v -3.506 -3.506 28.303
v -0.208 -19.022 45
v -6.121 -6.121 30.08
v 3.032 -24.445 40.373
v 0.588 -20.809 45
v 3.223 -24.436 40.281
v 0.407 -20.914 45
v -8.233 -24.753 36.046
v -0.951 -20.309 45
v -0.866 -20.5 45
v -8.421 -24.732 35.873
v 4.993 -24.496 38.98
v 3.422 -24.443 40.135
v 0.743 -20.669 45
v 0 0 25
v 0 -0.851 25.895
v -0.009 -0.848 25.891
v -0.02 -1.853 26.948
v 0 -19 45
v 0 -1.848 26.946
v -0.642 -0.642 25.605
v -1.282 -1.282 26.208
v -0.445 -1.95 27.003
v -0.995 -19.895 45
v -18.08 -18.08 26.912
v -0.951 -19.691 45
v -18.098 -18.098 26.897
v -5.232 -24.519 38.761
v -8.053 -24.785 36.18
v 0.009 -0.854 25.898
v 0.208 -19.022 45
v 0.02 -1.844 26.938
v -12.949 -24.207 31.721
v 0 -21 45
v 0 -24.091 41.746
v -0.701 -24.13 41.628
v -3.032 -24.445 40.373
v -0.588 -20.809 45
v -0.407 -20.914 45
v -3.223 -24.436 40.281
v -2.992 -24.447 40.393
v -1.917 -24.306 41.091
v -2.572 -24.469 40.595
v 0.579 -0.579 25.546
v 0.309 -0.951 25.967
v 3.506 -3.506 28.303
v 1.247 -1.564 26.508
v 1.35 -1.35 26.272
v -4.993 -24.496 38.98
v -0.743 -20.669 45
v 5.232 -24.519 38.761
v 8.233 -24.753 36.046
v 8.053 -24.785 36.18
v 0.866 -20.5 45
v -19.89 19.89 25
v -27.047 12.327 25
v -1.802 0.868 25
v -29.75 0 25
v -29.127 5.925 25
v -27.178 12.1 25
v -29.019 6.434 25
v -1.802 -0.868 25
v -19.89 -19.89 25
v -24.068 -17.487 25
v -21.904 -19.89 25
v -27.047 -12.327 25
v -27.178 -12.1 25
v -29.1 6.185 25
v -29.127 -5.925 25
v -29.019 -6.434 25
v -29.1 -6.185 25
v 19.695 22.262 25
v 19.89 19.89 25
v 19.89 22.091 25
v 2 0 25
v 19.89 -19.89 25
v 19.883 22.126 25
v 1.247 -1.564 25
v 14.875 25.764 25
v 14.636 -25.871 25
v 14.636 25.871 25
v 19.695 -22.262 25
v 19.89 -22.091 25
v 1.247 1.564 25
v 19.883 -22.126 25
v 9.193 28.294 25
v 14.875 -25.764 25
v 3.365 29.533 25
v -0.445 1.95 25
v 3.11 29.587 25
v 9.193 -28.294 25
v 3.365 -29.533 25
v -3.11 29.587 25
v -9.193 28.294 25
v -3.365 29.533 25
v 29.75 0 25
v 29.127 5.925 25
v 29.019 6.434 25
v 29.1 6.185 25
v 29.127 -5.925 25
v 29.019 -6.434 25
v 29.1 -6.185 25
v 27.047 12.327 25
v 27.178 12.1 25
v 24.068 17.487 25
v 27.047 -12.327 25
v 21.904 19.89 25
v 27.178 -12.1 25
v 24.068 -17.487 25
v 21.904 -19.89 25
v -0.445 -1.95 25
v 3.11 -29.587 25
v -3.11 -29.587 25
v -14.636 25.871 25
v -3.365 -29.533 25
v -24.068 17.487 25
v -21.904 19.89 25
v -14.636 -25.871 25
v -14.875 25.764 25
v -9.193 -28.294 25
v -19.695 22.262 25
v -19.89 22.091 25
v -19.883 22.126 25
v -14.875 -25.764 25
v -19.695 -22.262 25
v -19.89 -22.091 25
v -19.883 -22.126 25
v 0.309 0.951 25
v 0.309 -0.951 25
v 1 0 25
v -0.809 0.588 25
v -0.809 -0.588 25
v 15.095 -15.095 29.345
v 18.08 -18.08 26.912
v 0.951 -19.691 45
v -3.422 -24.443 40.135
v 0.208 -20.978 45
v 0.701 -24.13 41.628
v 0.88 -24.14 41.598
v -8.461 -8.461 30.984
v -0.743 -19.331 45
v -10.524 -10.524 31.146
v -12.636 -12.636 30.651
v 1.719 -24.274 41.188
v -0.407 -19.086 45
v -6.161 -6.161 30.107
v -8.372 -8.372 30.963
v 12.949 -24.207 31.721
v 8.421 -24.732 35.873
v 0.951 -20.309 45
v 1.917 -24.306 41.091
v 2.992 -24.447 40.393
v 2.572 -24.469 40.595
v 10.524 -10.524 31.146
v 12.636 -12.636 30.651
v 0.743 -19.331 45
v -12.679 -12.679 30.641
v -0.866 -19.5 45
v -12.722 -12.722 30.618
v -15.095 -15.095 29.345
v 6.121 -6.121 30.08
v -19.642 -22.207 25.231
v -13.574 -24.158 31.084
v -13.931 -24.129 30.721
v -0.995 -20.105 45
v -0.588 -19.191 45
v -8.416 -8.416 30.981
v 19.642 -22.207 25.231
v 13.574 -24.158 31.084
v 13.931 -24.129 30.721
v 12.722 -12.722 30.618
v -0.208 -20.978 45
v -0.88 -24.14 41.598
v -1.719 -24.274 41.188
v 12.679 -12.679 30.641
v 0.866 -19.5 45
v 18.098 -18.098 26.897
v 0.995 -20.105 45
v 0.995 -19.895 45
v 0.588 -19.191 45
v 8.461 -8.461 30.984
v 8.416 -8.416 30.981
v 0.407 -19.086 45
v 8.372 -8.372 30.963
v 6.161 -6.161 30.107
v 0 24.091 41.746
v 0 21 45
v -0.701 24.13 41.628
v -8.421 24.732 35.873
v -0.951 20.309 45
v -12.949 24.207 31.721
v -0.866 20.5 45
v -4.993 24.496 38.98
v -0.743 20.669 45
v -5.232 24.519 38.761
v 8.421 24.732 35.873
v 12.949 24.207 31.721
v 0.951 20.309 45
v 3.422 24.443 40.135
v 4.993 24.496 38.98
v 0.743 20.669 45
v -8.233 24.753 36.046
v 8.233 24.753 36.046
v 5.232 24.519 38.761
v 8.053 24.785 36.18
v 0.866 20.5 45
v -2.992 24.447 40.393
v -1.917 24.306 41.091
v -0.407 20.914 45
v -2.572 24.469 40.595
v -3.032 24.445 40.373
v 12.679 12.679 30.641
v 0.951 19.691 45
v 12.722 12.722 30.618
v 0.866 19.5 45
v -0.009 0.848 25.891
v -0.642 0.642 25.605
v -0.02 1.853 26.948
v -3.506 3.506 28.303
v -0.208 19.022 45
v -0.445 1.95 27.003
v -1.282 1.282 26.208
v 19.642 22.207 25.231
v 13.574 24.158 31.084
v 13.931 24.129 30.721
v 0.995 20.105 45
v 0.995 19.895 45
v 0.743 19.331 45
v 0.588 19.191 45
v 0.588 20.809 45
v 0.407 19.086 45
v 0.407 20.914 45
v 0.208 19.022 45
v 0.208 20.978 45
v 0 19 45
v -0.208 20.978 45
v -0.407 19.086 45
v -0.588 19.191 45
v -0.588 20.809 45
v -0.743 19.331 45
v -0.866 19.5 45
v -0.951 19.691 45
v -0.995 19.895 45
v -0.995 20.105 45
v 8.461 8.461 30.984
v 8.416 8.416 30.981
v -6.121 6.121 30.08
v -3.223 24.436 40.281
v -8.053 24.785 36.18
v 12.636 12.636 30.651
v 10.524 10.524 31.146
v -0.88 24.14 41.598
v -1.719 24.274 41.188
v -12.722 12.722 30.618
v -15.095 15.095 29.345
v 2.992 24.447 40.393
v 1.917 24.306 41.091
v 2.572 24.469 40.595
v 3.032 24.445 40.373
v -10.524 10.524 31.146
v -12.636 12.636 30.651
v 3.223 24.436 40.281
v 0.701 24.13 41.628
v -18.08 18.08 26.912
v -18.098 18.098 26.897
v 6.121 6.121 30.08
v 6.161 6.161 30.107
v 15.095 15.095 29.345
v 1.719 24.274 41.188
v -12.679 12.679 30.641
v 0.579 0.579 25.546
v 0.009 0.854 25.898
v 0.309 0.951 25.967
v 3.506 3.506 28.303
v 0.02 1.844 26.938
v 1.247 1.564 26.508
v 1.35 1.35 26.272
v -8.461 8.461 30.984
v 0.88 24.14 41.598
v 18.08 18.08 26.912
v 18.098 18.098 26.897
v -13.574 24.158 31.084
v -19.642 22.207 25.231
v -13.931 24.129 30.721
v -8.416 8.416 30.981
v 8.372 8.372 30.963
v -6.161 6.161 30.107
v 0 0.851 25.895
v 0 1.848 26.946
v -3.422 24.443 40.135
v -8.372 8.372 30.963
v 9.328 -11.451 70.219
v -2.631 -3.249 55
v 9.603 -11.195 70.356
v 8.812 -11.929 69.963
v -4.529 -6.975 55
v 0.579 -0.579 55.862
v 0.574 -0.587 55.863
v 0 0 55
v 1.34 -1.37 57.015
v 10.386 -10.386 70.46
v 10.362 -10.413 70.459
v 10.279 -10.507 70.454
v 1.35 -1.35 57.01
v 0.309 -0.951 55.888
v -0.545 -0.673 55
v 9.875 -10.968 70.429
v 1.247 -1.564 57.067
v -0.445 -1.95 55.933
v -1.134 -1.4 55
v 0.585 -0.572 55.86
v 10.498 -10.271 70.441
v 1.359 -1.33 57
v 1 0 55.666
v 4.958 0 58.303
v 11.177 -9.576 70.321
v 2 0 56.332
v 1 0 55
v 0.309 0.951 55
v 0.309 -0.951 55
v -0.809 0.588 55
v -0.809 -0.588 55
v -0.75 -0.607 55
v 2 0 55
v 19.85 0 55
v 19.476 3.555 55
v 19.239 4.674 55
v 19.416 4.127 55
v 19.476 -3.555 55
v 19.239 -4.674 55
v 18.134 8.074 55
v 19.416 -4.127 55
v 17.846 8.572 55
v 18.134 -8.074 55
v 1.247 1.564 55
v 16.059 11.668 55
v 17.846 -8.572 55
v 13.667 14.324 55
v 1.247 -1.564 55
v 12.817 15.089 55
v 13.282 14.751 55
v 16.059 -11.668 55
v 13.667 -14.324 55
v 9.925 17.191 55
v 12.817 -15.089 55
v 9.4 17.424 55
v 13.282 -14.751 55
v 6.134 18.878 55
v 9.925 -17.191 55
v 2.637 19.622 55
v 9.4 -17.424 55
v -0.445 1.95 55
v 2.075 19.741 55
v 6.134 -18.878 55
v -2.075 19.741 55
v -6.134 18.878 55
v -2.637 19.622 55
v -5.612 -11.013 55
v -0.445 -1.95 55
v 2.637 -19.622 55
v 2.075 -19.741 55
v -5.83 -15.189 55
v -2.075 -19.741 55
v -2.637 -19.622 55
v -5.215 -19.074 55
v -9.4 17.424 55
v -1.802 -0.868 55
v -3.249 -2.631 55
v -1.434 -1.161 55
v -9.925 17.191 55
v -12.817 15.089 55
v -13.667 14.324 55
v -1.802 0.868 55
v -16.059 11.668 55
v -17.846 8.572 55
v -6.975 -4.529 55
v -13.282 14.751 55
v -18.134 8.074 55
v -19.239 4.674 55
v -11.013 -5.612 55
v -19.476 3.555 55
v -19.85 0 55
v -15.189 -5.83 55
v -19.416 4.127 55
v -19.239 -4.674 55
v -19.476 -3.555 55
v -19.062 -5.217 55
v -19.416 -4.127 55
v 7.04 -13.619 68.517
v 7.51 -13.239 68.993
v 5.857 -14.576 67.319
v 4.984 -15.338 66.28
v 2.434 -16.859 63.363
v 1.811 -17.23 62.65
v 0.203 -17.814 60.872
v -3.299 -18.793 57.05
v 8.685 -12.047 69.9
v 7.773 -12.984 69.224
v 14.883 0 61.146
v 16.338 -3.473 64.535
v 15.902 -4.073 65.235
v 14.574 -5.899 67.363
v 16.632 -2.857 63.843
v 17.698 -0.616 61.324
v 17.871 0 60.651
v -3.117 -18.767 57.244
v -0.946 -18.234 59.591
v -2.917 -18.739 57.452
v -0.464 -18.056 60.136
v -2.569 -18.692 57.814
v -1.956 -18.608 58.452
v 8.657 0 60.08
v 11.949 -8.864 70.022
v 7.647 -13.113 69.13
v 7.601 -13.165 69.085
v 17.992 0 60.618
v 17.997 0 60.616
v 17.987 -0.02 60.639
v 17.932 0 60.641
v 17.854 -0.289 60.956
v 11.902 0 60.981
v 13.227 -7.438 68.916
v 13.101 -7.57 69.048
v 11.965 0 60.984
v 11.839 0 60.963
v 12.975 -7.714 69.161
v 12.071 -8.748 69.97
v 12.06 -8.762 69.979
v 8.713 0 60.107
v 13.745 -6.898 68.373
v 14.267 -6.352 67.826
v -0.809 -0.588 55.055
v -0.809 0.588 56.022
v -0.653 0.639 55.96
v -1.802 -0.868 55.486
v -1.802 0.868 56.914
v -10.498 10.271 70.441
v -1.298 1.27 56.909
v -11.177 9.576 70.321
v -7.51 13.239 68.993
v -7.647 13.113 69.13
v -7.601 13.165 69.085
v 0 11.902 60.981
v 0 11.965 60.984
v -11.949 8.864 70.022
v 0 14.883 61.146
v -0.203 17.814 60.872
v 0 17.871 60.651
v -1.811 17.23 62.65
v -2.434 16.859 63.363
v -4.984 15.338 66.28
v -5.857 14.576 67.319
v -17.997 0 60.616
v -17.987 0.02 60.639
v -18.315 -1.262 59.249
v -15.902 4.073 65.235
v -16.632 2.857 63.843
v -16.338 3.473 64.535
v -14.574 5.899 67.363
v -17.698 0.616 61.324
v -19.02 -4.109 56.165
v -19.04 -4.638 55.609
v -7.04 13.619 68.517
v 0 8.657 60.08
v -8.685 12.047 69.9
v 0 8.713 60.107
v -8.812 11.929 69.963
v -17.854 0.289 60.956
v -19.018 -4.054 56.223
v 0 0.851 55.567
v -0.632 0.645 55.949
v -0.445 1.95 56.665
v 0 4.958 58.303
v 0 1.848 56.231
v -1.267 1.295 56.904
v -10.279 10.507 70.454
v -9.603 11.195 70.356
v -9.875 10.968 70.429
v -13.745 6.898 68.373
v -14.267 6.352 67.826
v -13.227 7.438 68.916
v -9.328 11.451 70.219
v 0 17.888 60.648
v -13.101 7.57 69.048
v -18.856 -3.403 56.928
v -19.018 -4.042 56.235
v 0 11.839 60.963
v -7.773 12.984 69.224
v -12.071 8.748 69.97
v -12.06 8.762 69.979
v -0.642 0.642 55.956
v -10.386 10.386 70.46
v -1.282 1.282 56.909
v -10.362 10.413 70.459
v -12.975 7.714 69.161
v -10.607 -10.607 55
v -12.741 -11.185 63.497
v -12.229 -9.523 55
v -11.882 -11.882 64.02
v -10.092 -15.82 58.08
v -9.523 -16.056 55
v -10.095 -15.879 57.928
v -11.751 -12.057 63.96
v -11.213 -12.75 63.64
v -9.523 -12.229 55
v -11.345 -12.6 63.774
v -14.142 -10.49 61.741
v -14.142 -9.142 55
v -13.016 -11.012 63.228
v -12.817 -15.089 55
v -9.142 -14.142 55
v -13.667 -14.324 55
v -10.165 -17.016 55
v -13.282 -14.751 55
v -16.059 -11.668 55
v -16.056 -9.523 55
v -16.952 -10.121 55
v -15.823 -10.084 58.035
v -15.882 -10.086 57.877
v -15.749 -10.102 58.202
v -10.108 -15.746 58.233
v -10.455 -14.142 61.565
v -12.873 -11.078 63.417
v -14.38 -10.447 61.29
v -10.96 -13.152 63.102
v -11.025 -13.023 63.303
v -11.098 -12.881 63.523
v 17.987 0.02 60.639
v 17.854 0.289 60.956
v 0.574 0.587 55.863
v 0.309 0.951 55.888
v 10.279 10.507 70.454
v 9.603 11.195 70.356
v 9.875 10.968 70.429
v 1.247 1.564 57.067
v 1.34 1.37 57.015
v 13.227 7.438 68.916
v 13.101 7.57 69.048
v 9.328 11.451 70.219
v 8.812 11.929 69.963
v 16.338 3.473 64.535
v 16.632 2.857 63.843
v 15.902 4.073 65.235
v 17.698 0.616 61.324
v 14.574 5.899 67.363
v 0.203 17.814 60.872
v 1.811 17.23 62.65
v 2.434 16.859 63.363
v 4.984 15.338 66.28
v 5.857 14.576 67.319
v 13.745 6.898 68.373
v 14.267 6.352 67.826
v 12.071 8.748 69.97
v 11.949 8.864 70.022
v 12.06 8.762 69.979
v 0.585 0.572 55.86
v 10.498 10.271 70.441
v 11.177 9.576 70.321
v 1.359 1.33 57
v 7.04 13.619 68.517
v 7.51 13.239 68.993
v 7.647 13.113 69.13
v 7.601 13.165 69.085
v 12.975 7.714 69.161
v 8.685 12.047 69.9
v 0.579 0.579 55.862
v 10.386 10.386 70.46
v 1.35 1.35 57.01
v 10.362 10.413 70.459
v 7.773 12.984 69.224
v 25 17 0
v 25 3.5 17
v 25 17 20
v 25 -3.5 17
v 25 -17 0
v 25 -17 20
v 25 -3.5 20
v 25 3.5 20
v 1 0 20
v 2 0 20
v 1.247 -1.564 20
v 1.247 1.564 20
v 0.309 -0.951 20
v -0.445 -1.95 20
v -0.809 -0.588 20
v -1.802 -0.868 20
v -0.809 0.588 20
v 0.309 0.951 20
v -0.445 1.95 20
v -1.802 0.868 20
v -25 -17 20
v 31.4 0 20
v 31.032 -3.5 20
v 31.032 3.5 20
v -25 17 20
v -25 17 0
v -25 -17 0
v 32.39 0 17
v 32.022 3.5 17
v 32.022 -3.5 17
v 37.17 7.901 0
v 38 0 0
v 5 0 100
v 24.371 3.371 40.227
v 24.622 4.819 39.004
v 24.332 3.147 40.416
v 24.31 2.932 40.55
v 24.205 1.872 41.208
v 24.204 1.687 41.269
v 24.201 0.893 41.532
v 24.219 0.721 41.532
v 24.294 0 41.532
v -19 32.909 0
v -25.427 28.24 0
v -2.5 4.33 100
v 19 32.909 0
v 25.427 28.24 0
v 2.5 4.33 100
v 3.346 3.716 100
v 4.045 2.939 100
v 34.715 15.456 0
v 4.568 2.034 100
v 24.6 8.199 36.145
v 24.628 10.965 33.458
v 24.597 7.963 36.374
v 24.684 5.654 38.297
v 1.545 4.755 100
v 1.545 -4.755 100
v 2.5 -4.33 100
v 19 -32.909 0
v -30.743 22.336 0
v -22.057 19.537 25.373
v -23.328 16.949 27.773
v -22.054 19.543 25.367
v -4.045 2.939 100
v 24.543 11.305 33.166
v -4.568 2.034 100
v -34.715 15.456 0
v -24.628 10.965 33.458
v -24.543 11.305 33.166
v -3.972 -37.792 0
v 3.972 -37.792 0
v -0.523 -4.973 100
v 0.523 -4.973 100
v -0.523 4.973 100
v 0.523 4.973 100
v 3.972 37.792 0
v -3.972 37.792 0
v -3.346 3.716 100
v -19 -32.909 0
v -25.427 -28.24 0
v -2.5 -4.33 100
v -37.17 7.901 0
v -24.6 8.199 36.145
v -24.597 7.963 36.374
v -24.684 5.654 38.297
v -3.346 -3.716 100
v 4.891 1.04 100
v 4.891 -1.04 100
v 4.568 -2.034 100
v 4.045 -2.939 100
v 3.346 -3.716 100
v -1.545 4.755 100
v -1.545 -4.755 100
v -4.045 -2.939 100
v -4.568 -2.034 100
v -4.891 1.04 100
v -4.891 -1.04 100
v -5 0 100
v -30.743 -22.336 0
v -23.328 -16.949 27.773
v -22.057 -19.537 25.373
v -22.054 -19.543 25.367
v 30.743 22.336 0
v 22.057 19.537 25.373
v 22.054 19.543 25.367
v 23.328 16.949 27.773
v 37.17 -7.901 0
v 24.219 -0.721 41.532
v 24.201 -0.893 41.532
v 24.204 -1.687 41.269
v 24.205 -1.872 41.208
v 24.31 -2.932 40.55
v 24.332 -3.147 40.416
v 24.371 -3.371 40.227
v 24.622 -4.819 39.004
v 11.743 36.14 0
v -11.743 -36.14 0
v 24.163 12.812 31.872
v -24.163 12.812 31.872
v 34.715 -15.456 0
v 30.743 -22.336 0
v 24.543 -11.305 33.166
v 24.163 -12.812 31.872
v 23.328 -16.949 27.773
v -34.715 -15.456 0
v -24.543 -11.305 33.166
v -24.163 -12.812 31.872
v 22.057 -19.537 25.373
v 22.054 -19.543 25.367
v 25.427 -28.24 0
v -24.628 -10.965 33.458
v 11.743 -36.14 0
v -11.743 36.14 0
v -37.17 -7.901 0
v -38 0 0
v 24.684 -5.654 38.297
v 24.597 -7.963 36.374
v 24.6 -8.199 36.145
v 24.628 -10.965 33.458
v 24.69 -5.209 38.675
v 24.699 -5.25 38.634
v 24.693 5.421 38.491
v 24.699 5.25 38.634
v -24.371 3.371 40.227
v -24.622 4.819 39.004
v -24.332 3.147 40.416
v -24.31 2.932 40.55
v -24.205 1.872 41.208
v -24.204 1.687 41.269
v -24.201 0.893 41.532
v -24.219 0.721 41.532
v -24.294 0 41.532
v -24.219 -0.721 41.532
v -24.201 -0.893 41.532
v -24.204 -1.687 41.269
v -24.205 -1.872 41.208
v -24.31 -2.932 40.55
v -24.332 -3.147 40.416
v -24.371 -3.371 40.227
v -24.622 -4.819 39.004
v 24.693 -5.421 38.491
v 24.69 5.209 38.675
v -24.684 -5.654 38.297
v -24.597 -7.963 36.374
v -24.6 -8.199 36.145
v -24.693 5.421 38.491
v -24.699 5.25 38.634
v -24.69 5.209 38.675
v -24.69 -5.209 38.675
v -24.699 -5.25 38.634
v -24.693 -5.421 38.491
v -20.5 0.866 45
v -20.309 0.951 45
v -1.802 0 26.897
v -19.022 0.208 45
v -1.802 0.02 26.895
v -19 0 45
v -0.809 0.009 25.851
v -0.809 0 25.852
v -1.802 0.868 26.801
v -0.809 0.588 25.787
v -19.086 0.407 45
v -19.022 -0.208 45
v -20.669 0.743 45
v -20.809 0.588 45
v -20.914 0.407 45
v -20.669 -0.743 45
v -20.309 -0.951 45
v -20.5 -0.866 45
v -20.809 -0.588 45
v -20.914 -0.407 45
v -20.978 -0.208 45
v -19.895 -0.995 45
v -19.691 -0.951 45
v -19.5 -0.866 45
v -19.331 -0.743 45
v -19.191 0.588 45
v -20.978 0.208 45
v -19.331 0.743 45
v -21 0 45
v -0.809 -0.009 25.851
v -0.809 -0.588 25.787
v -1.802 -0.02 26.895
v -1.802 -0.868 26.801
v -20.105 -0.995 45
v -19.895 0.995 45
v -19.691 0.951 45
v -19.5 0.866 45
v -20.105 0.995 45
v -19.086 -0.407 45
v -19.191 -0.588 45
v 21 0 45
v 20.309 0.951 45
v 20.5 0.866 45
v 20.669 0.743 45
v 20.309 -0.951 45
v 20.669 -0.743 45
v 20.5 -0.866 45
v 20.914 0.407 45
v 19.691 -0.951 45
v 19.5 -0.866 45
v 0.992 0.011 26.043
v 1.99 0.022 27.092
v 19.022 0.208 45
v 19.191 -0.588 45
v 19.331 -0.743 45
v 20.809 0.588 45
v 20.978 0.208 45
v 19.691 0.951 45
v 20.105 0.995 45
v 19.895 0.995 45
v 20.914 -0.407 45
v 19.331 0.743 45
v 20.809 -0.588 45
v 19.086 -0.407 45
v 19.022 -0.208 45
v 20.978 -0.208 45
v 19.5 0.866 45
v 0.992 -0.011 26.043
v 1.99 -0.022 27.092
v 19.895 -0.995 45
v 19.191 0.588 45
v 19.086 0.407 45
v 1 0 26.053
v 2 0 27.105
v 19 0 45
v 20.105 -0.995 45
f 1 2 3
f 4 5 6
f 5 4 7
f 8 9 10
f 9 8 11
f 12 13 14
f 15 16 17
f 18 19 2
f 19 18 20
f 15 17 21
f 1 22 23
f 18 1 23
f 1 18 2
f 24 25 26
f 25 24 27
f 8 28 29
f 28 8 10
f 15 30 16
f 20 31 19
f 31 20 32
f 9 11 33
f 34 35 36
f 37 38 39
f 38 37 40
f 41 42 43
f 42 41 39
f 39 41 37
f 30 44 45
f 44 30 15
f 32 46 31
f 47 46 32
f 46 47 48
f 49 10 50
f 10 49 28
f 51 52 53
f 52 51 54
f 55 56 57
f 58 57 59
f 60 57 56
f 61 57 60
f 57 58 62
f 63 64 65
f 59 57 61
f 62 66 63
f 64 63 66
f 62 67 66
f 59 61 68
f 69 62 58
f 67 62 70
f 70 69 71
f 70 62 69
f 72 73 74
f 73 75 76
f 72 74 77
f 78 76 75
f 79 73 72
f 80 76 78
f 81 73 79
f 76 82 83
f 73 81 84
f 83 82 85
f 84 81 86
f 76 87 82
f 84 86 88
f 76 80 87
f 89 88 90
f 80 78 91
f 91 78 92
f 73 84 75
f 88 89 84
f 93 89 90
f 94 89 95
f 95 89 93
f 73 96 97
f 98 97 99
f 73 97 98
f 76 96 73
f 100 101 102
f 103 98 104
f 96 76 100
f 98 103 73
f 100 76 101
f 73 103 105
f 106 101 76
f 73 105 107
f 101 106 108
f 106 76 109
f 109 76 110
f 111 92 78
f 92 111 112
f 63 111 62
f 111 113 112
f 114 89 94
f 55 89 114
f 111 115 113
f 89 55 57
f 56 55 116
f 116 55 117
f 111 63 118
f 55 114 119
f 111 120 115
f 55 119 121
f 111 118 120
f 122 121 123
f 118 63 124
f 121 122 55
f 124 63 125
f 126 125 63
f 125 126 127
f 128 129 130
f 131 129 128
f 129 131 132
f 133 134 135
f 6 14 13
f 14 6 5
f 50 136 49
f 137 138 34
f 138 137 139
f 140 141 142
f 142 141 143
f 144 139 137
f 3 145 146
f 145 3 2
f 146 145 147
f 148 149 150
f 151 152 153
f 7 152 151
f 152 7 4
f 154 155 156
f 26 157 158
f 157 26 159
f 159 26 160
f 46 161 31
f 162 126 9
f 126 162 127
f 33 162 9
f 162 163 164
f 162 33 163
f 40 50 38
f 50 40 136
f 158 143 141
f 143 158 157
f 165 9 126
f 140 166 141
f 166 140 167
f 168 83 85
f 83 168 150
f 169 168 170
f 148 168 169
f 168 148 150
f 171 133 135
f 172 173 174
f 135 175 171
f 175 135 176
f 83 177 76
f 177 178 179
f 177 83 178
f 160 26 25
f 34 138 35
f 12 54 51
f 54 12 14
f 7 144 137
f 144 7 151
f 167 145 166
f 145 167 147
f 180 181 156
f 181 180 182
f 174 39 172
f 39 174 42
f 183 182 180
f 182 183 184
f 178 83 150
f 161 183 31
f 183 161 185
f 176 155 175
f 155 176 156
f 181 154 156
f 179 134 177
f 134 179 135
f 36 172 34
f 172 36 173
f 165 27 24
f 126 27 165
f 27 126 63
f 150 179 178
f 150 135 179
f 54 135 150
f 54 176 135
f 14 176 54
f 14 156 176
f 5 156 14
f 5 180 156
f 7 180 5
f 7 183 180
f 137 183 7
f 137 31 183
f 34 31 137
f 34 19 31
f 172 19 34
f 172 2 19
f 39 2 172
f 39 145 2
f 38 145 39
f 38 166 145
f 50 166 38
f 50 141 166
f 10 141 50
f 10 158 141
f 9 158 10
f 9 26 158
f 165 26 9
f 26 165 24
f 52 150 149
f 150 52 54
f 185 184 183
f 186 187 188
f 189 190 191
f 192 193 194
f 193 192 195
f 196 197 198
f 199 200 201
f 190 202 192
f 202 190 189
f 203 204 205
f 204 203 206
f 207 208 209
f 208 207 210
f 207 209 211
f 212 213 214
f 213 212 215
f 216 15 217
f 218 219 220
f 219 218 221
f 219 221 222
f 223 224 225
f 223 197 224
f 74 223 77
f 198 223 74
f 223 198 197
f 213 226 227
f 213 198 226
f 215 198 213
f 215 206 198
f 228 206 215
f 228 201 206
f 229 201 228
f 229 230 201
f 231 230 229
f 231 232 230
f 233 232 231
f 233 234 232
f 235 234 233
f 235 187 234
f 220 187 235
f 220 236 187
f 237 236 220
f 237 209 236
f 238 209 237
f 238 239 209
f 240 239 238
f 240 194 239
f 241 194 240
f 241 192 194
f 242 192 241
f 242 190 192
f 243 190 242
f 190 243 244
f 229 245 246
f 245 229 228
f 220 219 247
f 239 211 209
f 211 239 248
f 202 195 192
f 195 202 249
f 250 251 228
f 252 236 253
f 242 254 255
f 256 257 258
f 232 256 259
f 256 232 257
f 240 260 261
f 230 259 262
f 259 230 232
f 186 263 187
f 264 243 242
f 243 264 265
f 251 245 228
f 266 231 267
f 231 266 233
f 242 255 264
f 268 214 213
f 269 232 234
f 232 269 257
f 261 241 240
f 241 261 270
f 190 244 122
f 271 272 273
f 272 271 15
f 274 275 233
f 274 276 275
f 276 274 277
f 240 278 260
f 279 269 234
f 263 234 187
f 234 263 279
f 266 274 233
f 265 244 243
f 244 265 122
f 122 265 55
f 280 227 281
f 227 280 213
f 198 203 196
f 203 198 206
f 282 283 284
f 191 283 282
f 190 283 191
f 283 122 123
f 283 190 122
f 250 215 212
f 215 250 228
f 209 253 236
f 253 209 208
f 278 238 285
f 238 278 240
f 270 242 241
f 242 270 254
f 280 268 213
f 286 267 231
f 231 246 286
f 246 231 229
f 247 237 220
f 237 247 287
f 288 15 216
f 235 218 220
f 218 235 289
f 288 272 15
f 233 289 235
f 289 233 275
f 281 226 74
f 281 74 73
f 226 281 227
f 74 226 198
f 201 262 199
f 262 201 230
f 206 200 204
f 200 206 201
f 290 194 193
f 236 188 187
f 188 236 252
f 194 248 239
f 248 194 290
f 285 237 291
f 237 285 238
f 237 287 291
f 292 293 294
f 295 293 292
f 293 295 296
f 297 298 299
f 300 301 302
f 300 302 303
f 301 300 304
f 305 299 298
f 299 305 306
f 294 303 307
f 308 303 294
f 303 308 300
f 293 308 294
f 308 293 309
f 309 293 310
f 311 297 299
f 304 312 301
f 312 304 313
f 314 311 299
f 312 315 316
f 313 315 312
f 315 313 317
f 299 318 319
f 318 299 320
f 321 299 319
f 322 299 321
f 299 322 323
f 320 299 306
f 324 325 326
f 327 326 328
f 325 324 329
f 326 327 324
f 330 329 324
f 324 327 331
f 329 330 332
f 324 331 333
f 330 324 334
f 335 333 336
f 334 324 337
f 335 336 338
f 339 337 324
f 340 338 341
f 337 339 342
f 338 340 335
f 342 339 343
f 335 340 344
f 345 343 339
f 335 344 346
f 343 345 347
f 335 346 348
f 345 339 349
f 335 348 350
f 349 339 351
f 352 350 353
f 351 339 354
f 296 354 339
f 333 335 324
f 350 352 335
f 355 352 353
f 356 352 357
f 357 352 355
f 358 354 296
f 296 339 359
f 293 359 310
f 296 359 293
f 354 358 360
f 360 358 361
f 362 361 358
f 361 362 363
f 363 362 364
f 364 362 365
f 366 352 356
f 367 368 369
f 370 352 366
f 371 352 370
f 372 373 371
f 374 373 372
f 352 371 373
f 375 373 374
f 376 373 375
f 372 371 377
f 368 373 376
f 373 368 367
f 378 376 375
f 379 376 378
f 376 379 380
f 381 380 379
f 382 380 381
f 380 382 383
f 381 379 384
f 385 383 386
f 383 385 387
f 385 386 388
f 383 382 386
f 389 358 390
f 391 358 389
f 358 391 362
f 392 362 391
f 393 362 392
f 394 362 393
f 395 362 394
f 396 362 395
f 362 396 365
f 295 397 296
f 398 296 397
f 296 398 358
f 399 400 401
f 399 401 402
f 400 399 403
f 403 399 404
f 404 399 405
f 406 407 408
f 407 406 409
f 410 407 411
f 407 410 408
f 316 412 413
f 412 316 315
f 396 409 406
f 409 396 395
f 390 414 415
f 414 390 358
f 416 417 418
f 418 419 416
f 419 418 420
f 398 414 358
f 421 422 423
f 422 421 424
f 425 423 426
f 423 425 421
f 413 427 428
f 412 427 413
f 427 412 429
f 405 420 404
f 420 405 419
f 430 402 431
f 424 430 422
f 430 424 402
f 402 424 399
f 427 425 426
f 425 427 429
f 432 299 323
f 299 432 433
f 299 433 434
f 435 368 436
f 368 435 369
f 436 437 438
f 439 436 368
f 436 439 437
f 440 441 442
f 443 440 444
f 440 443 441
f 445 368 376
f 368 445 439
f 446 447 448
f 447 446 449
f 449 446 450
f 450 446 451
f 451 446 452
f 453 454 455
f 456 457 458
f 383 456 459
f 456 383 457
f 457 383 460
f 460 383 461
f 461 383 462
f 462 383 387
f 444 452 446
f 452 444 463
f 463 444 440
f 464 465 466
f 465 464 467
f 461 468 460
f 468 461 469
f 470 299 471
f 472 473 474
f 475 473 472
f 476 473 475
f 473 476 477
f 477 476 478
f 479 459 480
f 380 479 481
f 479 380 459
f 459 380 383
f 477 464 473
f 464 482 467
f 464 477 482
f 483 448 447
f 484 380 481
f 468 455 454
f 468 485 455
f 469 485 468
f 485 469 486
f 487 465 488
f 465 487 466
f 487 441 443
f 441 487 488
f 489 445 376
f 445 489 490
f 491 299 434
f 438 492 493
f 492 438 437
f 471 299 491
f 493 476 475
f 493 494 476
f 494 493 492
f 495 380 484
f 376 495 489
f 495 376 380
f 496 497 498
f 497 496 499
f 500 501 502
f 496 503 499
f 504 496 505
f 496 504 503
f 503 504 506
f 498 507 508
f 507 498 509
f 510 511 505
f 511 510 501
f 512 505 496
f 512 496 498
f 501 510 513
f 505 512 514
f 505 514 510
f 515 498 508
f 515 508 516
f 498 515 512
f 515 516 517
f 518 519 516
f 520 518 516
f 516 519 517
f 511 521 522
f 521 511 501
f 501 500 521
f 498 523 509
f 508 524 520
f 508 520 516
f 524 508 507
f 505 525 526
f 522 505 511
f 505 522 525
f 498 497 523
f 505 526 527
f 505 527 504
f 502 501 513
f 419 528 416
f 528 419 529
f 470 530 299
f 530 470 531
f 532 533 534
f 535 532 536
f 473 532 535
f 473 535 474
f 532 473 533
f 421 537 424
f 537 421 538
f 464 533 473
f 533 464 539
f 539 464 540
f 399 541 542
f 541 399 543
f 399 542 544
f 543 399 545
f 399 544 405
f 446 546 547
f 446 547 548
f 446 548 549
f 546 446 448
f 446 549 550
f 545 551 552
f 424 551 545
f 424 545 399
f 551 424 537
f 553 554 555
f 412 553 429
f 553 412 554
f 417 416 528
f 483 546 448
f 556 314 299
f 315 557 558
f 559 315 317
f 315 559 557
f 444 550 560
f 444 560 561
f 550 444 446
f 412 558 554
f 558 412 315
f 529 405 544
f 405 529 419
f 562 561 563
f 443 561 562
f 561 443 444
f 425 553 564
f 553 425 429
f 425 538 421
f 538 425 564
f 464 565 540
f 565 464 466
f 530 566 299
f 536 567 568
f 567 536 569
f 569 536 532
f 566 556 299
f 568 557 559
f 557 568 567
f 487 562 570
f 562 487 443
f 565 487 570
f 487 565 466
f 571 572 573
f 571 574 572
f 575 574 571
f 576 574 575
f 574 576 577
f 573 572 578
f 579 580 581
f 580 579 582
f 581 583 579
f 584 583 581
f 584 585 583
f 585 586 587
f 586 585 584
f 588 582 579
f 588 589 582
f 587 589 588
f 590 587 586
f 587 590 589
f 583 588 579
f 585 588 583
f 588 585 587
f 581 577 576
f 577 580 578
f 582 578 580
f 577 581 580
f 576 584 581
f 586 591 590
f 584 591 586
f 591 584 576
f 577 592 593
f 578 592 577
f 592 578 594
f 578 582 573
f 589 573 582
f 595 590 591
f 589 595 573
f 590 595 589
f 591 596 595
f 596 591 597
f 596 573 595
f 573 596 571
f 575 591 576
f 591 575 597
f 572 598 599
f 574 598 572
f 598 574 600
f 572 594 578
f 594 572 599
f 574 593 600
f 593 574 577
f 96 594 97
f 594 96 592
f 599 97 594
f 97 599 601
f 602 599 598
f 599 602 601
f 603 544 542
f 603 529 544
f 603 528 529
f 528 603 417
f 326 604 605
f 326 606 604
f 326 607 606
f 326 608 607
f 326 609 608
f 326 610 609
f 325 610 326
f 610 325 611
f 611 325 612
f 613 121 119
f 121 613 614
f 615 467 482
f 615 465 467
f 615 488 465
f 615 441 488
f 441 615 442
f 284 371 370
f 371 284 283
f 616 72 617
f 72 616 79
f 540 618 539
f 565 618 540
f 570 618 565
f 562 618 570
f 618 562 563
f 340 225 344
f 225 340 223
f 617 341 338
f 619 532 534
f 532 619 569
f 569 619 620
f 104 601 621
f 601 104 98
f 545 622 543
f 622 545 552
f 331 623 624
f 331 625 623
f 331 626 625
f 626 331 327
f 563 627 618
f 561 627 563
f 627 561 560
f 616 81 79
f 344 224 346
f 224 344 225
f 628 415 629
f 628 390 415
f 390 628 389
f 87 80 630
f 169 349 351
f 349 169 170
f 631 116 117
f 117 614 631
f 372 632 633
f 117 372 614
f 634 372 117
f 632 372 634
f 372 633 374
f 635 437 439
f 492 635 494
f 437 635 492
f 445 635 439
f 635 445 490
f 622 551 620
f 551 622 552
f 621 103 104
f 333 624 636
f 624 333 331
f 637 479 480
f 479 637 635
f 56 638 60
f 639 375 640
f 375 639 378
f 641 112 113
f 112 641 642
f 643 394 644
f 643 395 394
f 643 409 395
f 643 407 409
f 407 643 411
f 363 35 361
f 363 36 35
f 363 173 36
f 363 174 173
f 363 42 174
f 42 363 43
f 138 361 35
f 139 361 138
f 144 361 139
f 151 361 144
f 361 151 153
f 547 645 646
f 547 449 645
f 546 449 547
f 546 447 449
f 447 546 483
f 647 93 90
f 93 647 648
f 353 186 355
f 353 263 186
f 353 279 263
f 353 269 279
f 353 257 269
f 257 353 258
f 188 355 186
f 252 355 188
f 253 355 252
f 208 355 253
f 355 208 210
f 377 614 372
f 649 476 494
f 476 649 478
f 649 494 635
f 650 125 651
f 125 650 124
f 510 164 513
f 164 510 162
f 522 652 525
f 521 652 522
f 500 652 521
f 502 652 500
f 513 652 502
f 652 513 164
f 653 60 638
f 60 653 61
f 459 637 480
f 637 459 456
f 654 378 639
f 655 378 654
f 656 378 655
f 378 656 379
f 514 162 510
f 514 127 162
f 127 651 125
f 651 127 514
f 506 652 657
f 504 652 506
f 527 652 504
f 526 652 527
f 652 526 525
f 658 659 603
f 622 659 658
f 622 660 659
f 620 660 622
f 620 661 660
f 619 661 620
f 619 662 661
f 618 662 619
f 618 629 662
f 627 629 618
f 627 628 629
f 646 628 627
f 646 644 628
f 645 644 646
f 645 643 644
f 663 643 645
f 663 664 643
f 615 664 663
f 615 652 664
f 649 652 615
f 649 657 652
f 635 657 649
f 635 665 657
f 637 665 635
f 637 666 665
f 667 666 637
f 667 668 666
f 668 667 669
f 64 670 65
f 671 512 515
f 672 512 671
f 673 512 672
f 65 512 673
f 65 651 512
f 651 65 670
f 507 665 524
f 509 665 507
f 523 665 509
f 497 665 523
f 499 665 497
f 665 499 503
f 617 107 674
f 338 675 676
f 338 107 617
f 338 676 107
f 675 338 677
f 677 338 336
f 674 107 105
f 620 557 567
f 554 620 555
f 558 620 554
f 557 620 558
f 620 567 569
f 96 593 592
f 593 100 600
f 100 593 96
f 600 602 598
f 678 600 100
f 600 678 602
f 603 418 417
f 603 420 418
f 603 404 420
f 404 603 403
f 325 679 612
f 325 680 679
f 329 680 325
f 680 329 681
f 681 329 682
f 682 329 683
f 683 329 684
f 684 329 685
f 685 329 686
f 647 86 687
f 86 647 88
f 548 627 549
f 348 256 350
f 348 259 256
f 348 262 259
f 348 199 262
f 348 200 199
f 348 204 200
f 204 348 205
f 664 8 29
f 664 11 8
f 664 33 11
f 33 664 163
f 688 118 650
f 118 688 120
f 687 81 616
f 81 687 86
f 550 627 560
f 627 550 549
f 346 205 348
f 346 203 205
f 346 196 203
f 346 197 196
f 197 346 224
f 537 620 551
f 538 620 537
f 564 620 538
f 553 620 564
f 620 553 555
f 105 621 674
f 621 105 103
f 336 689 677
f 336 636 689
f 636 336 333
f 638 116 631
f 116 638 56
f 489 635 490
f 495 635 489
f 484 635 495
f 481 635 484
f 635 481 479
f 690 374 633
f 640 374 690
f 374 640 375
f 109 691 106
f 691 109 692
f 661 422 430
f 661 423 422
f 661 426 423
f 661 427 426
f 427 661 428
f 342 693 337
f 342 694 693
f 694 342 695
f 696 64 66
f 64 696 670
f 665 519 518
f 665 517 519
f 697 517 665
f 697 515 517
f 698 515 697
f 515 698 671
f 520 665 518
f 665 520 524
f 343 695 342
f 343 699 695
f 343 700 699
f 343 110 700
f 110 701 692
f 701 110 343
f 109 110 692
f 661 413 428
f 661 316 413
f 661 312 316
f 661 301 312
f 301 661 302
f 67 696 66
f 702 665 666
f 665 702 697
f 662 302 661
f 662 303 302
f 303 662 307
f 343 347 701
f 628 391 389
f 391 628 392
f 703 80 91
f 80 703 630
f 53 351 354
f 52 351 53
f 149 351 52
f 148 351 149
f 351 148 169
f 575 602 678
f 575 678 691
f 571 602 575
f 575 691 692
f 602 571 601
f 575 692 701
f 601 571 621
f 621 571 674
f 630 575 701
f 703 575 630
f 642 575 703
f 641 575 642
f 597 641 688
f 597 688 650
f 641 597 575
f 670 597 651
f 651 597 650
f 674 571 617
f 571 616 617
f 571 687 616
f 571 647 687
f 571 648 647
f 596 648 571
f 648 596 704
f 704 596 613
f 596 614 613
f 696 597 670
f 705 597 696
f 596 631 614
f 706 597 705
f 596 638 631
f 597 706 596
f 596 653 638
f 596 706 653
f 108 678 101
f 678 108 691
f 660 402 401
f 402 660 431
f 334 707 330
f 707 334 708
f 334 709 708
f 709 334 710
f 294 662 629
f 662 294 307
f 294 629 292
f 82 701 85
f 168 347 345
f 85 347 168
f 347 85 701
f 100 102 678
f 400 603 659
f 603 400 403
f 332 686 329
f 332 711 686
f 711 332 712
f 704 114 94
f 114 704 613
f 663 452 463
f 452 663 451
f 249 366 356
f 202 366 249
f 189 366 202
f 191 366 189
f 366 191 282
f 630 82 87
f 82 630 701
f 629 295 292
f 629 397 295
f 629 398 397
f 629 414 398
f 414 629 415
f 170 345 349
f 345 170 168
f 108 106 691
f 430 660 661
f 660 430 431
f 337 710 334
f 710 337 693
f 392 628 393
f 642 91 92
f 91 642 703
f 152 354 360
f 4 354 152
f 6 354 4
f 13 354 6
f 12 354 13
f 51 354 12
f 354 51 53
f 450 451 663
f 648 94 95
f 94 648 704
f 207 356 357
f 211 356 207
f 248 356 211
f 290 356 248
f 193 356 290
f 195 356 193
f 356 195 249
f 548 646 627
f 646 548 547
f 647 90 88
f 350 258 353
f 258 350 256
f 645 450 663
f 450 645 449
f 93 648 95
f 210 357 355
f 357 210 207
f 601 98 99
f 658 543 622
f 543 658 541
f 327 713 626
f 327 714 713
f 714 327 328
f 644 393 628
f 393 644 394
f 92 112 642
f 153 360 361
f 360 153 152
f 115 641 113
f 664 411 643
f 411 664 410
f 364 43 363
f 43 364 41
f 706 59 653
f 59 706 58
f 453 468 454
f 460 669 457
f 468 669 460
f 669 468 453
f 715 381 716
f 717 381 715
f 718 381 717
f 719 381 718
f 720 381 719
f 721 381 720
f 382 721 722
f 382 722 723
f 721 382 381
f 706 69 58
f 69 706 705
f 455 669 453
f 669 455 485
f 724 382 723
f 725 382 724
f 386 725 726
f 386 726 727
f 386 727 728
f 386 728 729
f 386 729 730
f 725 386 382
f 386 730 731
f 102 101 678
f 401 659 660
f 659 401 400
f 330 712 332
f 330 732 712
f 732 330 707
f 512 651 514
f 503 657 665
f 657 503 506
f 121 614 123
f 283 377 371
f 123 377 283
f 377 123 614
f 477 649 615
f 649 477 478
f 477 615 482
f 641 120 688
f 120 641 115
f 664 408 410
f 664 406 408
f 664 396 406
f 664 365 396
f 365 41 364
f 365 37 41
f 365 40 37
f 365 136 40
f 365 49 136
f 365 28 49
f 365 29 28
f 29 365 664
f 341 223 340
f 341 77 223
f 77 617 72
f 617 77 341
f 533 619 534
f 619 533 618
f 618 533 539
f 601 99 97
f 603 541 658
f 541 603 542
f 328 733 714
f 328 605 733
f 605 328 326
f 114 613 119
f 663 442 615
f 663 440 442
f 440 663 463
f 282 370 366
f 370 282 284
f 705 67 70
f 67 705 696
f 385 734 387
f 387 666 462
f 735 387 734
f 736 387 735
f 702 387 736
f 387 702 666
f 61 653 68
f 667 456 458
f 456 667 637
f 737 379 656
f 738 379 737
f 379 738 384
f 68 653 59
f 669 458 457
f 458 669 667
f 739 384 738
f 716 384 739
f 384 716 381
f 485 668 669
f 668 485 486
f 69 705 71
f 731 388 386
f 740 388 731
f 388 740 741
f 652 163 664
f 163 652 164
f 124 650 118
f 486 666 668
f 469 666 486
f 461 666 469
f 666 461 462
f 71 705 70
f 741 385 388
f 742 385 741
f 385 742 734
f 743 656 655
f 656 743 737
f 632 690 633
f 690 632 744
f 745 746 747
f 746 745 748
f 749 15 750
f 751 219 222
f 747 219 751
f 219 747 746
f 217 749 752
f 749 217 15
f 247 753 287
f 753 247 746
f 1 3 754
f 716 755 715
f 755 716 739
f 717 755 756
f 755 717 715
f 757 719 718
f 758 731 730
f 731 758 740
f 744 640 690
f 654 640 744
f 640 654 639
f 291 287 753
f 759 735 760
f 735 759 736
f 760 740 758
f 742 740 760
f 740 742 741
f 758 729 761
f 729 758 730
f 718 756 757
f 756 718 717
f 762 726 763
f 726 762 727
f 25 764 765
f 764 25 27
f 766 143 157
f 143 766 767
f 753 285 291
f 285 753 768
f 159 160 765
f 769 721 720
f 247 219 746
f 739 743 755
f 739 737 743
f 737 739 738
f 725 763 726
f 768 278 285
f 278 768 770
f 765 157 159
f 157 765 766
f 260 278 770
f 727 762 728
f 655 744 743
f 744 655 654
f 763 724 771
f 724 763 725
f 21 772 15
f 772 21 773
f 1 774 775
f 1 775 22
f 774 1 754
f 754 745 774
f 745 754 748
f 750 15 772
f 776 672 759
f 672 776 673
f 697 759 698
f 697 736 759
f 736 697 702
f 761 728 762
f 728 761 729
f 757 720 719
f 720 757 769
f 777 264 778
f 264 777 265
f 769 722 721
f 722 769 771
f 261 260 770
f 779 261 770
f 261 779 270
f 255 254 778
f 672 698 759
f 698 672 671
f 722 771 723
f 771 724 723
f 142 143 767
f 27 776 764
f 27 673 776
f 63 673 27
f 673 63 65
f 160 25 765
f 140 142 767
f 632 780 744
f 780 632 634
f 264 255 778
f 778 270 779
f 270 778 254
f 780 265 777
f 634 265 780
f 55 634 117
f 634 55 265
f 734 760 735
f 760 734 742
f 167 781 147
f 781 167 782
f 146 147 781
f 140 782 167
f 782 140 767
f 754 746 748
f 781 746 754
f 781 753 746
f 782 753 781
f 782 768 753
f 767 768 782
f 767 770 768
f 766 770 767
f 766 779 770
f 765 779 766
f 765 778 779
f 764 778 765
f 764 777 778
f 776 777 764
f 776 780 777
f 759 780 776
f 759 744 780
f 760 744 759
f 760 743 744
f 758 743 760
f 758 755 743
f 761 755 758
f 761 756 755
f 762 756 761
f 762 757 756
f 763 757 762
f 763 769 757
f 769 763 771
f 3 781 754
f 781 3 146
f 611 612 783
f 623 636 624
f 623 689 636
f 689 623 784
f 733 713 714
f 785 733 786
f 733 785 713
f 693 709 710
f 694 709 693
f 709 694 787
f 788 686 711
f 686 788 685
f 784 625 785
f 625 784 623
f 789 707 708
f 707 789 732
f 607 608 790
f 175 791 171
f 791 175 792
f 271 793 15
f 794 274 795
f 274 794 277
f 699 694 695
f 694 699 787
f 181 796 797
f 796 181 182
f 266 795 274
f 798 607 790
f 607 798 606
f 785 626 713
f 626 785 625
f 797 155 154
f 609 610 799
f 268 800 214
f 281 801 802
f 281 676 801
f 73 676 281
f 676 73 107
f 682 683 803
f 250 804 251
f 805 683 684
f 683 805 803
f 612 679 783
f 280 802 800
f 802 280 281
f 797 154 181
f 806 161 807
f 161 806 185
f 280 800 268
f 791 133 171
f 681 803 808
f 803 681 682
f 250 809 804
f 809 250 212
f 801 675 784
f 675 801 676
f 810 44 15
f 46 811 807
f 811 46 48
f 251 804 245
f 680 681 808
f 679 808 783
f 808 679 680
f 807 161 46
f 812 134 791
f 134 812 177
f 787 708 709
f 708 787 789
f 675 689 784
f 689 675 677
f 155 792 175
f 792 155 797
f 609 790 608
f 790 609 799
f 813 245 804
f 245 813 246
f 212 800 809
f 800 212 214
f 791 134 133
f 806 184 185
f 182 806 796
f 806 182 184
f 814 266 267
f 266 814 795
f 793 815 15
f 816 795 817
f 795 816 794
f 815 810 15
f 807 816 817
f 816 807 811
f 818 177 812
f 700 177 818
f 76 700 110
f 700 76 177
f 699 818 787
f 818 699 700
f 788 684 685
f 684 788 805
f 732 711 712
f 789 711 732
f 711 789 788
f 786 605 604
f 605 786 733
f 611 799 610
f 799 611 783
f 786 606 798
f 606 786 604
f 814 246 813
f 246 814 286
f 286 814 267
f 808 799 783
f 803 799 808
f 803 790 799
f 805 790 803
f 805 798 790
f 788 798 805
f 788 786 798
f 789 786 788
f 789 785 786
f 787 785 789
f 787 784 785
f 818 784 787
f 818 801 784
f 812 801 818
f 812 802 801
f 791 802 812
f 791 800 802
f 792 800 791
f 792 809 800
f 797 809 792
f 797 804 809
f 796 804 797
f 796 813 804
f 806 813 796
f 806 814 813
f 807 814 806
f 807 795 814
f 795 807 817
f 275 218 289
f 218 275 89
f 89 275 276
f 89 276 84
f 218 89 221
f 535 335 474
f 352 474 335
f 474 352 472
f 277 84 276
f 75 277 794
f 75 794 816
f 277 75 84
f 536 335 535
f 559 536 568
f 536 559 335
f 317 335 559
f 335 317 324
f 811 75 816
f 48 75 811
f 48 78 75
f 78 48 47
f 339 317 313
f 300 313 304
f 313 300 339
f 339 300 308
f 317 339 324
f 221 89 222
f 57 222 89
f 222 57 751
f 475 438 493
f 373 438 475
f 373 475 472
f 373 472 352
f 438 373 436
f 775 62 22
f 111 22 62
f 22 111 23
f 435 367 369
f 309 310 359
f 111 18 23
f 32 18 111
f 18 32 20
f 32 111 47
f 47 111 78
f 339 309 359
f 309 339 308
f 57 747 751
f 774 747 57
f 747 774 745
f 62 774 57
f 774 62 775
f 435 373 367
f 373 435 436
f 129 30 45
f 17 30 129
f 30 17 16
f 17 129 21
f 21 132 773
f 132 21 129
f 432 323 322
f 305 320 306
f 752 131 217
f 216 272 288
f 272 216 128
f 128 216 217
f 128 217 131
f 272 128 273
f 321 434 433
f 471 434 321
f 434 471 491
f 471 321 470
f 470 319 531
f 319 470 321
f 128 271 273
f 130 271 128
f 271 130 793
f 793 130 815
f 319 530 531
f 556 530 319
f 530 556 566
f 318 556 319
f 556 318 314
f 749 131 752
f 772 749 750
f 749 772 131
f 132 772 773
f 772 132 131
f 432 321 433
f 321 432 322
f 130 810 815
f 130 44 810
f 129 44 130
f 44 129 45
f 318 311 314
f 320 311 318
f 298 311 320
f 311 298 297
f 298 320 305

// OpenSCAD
difference(){

	union(){

		// body
		cylinder(r1=38,r2=5,h=100);

	}

	// cut-outs

	// first floor
	translate([-20,0,25]){
		cylinder(r1=20,r2=1,h=20);
	}

	translate([20,0,25]){
		cylinder(r1=20,r2=1,h=20);
	}

	rotate([0,0,90]){
		translate([-20,0,25]){
			cylinder(r1=20,r2=1,h=20);
		}

		translate([20,0,25]){
			cylinder(r1=20,r2=1,h=20);
		}
	}

		// second floor
		rotate([0,0,45]){
		translate([-20,0,55]){
			#cylinder(r1=5,r2=1,h=20);
		}

		translate([20,0,55]){
			cylinder(r1=20,r2=1,h=20);
		}

		rotate([0,0,90]){
			translate([-20,0,55]){
			cylinder(r1=20,r2=1,h=20);
			}

			translate([20,0,55]){
				cylinder(r1=20,r2=1,h=20);
			}
		}
	}
	/*
	translate([-13,-50,25]){
		cube([26,100,10]);
	}
	rotate([0,0,90]){
		translate([-13,-50,25]){
			cube([26,100,10]);
		}
	}
	*/

	// breadboard bounding box
	translate([-25,-17,0]){
		union(){
			translate([0,0,-1]){
				cube([50,34,21]);
			}
			translate([48,13.5,17]){
				cube([10,7,3]);
			}
		}
	}
}

// sensor wire channel
difference(){

	translate([0,0,20]){

		// sensor wire tube
		cylinder(r=2,h=80);
	}

	// sensor wire hole
	#cylinder(r=1,h=110);
	
}
